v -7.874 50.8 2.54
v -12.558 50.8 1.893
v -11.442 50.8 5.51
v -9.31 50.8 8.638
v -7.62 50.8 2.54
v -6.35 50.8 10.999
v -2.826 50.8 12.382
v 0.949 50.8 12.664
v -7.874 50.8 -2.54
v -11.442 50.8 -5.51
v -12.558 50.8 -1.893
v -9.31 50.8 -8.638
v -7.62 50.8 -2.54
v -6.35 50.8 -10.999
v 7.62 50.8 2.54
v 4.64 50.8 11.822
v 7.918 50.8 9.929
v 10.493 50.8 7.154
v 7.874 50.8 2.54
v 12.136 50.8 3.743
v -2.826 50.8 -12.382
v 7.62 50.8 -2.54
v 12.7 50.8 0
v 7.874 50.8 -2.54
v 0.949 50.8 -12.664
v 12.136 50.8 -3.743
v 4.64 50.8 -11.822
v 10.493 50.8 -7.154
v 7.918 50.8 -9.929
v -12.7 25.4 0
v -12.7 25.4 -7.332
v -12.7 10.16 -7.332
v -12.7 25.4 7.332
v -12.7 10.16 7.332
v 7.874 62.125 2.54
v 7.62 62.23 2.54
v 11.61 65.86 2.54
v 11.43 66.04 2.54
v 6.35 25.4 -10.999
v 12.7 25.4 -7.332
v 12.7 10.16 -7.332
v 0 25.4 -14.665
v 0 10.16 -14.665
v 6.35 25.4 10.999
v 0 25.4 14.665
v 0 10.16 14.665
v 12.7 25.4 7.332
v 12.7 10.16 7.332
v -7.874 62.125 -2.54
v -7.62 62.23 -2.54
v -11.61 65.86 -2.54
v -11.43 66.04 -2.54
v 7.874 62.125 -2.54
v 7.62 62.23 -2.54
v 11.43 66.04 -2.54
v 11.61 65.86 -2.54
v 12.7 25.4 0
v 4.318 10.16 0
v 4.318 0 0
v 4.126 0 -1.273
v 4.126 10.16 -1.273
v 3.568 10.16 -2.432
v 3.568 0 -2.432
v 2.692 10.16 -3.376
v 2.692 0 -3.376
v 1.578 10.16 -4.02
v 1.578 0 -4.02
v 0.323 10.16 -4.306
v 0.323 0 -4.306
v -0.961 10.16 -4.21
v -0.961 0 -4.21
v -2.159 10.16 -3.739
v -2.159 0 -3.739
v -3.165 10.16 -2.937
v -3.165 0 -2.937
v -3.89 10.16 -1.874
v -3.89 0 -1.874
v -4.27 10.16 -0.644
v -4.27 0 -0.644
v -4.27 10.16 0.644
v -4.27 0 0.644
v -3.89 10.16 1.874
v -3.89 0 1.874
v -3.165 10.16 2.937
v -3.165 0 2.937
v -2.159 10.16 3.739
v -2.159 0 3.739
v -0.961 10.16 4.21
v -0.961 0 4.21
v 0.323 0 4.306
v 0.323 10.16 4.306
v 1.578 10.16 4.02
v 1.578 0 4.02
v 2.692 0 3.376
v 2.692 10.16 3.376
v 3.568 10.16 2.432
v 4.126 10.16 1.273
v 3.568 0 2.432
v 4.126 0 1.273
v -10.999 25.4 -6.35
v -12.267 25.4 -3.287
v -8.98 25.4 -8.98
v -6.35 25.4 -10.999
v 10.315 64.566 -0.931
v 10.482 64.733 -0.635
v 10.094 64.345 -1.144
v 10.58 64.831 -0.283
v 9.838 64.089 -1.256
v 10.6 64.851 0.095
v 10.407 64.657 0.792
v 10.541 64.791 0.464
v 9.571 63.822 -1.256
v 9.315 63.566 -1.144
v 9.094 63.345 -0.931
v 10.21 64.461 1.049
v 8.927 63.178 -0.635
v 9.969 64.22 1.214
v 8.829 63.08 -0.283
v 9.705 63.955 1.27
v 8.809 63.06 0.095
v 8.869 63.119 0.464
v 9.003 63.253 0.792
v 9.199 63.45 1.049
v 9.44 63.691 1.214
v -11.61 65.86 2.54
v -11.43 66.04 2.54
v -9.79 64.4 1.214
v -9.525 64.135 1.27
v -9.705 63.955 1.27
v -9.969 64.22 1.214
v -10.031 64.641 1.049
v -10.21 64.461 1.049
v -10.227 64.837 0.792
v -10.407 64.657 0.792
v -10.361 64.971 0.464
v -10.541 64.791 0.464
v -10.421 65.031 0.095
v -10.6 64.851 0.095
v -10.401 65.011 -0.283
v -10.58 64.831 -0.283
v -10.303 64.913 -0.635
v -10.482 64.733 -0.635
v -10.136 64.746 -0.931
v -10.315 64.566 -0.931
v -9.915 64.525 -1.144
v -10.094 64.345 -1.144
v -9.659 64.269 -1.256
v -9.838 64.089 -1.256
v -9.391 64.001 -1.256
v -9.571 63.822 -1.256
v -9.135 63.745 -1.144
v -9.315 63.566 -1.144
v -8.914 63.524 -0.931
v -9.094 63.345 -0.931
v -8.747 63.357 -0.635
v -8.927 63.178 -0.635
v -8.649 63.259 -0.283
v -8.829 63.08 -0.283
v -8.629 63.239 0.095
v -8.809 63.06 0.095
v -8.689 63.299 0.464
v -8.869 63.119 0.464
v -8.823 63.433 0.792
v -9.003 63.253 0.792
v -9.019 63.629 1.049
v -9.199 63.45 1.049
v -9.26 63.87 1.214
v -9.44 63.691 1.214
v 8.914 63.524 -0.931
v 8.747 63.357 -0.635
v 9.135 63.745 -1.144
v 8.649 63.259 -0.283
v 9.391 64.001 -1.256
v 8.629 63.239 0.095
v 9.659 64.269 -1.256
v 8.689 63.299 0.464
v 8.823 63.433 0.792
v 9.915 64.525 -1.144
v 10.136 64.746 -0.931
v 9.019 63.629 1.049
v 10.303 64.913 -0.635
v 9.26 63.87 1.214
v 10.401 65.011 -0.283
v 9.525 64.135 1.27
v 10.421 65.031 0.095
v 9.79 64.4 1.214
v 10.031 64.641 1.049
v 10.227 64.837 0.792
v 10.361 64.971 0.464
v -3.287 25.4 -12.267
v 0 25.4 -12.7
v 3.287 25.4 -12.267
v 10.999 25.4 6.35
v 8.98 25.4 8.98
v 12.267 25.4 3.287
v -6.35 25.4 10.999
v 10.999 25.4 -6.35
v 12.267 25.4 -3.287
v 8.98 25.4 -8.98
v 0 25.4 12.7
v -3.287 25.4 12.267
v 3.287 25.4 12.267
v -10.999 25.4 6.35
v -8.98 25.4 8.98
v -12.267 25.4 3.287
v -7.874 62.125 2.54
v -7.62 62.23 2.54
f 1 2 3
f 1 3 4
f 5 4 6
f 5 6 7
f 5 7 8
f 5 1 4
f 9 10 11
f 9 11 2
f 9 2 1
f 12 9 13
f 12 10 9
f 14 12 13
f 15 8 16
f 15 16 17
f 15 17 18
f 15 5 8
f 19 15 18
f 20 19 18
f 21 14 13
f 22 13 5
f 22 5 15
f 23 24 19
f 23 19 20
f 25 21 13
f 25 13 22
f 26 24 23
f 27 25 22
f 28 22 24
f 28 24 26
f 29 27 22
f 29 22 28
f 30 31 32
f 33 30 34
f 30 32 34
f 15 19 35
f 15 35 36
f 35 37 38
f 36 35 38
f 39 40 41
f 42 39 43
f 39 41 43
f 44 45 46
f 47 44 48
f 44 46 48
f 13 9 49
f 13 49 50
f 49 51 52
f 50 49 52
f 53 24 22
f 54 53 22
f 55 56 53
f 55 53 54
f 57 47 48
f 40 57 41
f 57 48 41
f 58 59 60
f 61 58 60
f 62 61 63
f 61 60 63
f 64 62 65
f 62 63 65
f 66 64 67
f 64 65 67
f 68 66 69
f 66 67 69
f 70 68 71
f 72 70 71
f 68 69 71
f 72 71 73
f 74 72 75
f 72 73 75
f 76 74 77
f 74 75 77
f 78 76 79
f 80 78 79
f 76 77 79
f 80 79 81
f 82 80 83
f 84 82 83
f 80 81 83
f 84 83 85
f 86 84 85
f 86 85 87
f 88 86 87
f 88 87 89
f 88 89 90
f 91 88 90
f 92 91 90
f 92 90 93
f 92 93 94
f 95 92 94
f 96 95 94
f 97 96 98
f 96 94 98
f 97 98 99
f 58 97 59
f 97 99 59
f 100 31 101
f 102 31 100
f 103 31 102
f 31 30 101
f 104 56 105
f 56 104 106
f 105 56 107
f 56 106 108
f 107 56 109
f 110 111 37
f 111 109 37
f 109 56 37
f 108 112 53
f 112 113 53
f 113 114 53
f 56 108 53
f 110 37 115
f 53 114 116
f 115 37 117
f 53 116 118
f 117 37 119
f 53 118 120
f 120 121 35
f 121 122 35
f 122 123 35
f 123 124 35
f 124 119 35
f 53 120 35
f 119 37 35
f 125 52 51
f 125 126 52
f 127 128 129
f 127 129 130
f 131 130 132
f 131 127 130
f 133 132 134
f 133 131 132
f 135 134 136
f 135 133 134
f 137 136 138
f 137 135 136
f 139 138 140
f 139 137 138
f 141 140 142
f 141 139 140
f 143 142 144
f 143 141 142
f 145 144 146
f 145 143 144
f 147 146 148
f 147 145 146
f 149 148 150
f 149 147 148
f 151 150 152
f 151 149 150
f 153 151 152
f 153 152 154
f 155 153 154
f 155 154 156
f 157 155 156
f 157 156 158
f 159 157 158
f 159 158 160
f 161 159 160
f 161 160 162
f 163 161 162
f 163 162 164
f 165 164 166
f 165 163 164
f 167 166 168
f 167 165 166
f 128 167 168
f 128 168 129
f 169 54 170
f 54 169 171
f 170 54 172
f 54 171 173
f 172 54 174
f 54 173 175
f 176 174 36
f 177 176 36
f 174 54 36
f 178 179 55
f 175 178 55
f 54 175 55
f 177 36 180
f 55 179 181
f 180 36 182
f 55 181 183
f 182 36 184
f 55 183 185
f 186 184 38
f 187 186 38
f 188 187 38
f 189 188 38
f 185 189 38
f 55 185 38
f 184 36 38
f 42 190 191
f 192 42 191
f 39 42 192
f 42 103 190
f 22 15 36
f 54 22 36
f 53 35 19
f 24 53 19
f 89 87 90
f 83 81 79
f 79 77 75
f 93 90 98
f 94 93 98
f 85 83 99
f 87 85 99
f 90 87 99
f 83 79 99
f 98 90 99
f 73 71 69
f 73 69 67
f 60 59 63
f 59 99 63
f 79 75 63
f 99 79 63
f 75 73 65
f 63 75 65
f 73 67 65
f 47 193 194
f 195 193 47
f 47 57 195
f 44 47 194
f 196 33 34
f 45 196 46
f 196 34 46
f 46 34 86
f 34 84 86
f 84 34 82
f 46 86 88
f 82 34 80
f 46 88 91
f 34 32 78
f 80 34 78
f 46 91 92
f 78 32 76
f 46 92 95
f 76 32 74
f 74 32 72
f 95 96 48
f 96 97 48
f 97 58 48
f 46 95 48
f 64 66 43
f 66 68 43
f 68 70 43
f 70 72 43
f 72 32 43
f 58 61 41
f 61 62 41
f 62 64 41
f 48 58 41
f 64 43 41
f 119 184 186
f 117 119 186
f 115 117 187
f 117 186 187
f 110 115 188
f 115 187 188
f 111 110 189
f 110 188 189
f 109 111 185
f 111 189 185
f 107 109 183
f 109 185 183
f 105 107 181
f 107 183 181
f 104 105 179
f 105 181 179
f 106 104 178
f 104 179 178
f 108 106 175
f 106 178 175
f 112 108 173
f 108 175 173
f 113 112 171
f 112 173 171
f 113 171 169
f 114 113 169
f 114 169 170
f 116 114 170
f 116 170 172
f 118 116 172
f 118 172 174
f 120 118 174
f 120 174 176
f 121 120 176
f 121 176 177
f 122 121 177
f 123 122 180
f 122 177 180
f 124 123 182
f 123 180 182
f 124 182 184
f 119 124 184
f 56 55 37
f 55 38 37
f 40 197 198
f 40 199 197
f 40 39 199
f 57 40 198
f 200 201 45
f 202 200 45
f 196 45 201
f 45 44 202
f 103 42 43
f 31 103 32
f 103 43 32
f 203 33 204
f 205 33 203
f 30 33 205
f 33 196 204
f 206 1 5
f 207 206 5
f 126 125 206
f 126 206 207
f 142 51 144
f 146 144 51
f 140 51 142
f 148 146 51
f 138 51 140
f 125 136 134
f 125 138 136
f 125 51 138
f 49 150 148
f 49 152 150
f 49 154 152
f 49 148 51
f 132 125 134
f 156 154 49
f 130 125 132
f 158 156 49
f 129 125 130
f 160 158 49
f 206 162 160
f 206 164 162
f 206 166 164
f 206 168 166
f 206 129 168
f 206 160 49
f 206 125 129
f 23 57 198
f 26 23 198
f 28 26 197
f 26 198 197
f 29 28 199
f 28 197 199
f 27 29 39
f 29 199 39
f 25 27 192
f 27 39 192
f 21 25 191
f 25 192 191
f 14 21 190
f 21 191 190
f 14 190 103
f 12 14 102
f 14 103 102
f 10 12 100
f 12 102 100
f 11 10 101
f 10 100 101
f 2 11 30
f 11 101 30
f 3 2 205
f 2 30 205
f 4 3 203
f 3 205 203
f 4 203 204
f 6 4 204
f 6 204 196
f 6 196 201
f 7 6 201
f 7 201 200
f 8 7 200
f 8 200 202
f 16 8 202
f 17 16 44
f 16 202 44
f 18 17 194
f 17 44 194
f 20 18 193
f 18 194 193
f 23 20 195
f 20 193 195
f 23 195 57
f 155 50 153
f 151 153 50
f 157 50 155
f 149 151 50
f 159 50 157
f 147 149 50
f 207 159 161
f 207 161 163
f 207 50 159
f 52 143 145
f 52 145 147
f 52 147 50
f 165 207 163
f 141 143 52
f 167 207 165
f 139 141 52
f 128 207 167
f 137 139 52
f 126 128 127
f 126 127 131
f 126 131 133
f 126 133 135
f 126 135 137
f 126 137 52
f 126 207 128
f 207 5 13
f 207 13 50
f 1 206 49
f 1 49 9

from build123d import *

# Parameters (mm, degrees)
SKETCH1_R           = 4.318
BOSS_EXTRUDE1_DEPTH = 10.16
BOSS_EXTRUDE2_DEPTH = 15.24
SKETCH3_R           = 12.7
BOSS_EXTRUDE3_DEPTH = 25.4
EXTRUDE_THIN1_DEPTH = 2.54
SKETCH5_R           = 1.27
CUT_EXTRUDE1_DEPTH  = 0.254


with BuildPart() as part:
    # Sketch1 → Boss-Extrude1 (new body)
    with BuildSketch(Plane(origin=(0, 0, 0), x_dir=(1, 0, 0), z_dir=(0, 1, 0))):
        Circle(SKETCH1_R)
    extrude(amount=BOSS_EXTRUDE1_DEPTH)

    # Sketch2 → Boss-Extrude2 (add)
    with BuildSketch(Plane(origin=(0, 10.16, 0), x_dir=(1, 0, 0), z_dir=(0, 1, 0))):
        Polygon((0, 14.664696837), (-12.7, 7.332348419), (-12.7, -7.332348419), (0, -14.664696837), (12.7, -7.332348419), (12.7, 7.332348419), align=None)
    extrude(amount=BOSS_EXTRUDE2_DEPTH)

    # Sketch3 → Boss-Extrude3 (add)
    with BuildSketch(Plane(origin=(0, 25.4, 0), x_dir=(1, 0, 0), z_dir=(0, 1, 0))):
        Circle(SKETCH3_R)
    extrude(amount=BOSS_EXTRUDE3_DEPTH)

    # Sketch4 → Extrude-Thin1 (add, symmetric)
    with BuildSketch(Plane.XY):
        Polygon((7.62, 50.8), (7.62, 62.23), (11.43, 66.04), (11.609605122, 65.860394878), (7.874, 62.124789755), (7.874, 50.8), align=None)
    extrude_thin1 = extrude(amount=EXTRUDE_THIN1_DEPTH, both=True)

    # Sketch5 → Cut-Extrude1 (cut)
    with BuildSketch(Plane(origin=(-27.305, 27.305, 0), x_dir=(0, 0, 1), z_dir=(-0.707106781, 0.707106781, 0))):
        with Locations((0, 52.085485502)):
            Circle(SKETCH5_R)
    cut_extrude1 = extrude(amount=-CUT_EXTRUDE1_DEPTH, mode=Mode.SUBTRACT)

    # Mirror1: Extrude-Thin1, Cut-Extrude1 across plane
    add(extrude_thin1.mirror(Plane(origin=(0, 0, 0), x_dir=(0, 0, 1), z_dir=(1, 0, 0))))
    add(cut_extrude1.mirror(Plane(origin=(0, 0, 0), x_dir=(0, 0, 1), z_dir=(1, 0, 0))), mode=Mode.SUBTRACT)


solid = part.part
